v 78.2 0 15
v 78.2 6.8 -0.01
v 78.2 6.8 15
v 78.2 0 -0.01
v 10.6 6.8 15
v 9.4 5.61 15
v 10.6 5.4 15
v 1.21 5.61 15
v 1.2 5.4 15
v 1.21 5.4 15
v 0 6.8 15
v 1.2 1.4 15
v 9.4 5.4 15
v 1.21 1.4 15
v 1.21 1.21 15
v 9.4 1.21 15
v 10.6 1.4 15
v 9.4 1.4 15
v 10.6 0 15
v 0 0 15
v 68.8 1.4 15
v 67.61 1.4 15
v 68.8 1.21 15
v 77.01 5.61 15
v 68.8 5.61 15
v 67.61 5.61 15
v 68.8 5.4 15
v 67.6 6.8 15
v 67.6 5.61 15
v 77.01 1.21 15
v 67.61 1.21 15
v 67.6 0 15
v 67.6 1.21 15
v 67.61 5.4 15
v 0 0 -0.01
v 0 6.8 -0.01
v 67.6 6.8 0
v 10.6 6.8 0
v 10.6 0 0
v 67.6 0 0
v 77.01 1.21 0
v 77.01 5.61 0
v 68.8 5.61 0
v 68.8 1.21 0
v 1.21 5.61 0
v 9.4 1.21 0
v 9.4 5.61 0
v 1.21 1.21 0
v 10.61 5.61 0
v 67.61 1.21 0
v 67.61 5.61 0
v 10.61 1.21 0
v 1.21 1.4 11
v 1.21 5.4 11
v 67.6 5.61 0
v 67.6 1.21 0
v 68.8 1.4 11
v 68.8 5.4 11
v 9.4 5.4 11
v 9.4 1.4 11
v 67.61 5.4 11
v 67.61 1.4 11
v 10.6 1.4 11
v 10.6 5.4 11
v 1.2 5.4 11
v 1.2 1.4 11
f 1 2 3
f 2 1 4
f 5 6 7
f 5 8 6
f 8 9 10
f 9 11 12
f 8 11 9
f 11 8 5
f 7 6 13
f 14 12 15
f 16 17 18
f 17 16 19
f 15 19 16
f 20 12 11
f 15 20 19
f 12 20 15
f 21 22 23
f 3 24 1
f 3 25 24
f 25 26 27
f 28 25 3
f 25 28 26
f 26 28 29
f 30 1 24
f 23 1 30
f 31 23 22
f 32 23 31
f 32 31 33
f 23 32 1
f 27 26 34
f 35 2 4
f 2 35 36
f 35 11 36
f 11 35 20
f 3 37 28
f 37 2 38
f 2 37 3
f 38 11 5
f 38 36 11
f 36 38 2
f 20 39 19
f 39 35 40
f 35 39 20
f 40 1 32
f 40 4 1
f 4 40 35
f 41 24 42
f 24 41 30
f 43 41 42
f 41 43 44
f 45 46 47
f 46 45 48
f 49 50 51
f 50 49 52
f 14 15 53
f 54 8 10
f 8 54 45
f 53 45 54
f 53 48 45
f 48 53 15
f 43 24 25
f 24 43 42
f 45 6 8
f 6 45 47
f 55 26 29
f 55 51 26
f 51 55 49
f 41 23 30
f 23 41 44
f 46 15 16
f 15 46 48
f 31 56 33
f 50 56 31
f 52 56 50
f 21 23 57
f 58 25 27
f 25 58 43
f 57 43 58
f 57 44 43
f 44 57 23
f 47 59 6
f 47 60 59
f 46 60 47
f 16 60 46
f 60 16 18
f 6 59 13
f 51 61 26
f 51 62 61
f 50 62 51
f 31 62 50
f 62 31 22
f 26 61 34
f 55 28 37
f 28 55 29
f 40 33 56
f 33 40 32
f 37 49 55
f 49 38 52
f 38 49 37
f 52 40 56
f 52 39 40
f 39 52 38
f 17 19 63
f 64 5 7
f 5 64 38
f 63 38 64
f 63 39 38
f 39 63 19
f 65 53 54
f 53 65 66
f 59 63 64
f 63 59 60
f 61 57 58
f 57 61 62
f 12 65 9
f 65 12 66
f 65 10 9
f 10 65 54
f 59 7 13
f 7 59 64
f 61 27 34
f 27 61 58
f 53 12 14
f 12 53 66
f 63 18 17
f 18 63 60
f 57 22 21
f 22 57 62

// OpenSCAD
// file: ../Base/Boxes.scad
// Fischertechnik Box Foundation
// Pre-designed Boxes

use <Constants.scad>

include <PlacementOptions.scad>

box190Width = 190;
box190Depth = 130;
box130Width = 130;
box130Depth = 95;

// Values are from an original ec3 box
topBottomDifference = 1.5;
outerHeight = 40;
baseThickness = 1.8;
innerHeight = outerHeight - baseThickness;
stackExcess = 5.7;
radius = 3.5;
wallThickness = 1.5;
tolerance = 0.2;

boxWallThickness = wallThickness;
boxBaseThickness = baseThickness;
boxWebWidth = 3.0;

// getBoxWallThickness()
// Gets the wall thickness of a Fischertechnik Box
function getBoxWallThickness() = boxWallThickness;

// getBoxUsageHeight(height = 38.2)
// Gets the usable height of a Fischertechnik box
// height = Outer height of the box from the bottom to the upper edge.
function getBoxUsageHeight(height = outerHeight) = height - baseThickness - stackExcess;

// getBoxInnerHeight()
// Gets the inner height of a Fischertechnik box, including the stack excess
function getBoxInnerHeight() = innerHeight;

// getBoxBaseThickness()
// Gets the thickness of the Fischertechnik box base.
function getBoxBaseThickness() = boxBaseThickness;

// getBoxWebWidth()
// Gets the width of a box web
function getBoxWebWidth() = boxWebWidth;

// getBox190Space()
// Gets the usable inner space of a Box 190 as an x/y-list
function getBox190Space() = [
    box190Width - 2*getBoxWallThickness() - topBottomDifference, 
    box190Depth - 2*getBoxWallThickness() - topBottomDifference ];

// RoundedCornerPlate(width, depth, height, radius)
// Creates a body plate with rounded corners for a box. Used
// also to create the complete box with the hull module.
// width = Width of the plate
// depth = depth of the plate 
// height = thickness of the plate
// radius = radius of the rounded corner
module RoundedCornerPlate(width, depth, height, radius) {
    translate([radius, radius])
    hull() {
        w = width-2*radius;
        d = depth-2*radius;
        cube([w, d, height]);
        cylinder(height, r=radius, $fn=getFragments());
        translate([w, 0])
            cylinder(height, r=radius, $fn=getFragments());
        translate([w, d])
            cylinder(height, r=radius, $fn=getFragments());
        translate([0, d])
            cylinder(height, r=radius, $fn=getFragments());
    }
}

// BoxBase(width, depth)
// Creates an empty stackable Fischertechnik compatible box
// width = Outer width of the box (190, 130, ...)
// depth = Outer depth of the box (130, 95, ...)

module BoxBase(width, depth, height=outerHeight) {    
    thinPlate = 0.01;

    innerHeight = height - baseThickness;    
    
    module Body(tolerance=tolerance) {
        hull() {
            // Bottom with tolerance to fit into the original boxes when stacked
            translate([-wallThickness+tolerance, -wallThickness+tolerance, -baseThickness])
                RoundedCornerPlate(width-topBottomDifference-2*tolerance, depth-topBottomDifference-2*tolerance, thinPlate, radius);
            
            // Top
            translate([-wallThickness-topBottomDifference/2, -wallThickness-topBottomDifference/2, innerHeight-thinPlate])
                RoundedCornerPlate(width, depth, thinPlate, radius);
         }
    }

    module Cutoff() {
        hull() {
            coWidth = width - 2*wallThickness;
            coDepth = depth - 2*wallThickness;
            
            // Bottom
            RoundedCornerPlate(coWidth-topBottomDifference, coDepth-topBottomDifference, thinPlate, radius);

            // Top
            translate([-topBottomDifference/2, -topBottomDifference/2, innerHeight+thinPlate]) 
                RoundedCornerPlate(coWidth, coDepth, thinPlate, radius);
        }
    }
    
    difference() {        
        Body();
        Cutoff();
        stackOffset = innerHeight - stackExcess;
        translate([0, 0, stackOffset + baseThickness])
            Body(tolerance=0);
    }
}

// Creates the Fischertechnik empty box 130x190 mm and places it at position 0,0
// 190x130 are the outer sizes, the inner space is slightly smaller. Use getBox190Space() to get the inner sizes.
// The box is positioned that the usable inner space is at the 0,0,0 position.

module Box190() {
    BoxBase(box190Width, box190Depth);
}

// Gets the usable inner space of a Box 130 as an x/y-list
function getBox130Space() = [
    box130Width - 2*getBoxWallThickness() - topBottomDifference, 
    box130Depth - 2*getBoxWallThickness() - topBottomDifference ];

// Creates the Fischertechnik empty box 95x130 mm and places it at position 0,0
// 190x130 are the outer sizes, the inner space is slightly smaller. Use getBox190Space() to get the inner sizes.
// The box is positioned that the usable inner space is at the 0,0,0 position.

module Box130() {
    BoxBase(box130Width, box130Depth);
}

// Creates a web at the specified box walls
// corner 0 = LowerLeft, 1 = UpperLeft, 2 = UpperRight, 3 = LowerRight
// side 0 = LeftOfCorner, 1 = RightOfCorner
// distance = Distance in mm from the corner
// boxSpace = inner width and depth of the box (default: Box 190)
// webWidth = length of the web (default is 3 mms)
// webThickness = thickness of the web (default is 1 mm)
// height = Height of the web (standard is getBoxUsageHeight())
// sink = How much of the web is sunk into the wall

module BoxWeb(
    corner, 
    side, 
    distance, 
    boxSpace=getBox190Space(), 
    webWidth=getBoxWebWidth(), 
    webThickness=1.0, 
    height=getBoxUsageHeight(),
    sink = getBoxWallThickness()/2) {
    width = (corner % 2 == 0) ? 
            (side == LeftOfCorner ? webWidth : webThickness) :
            (side == LeftOfCorner ? webThickness : webWidth);

    depth = (corner % 2 == 0) ? 
            (side == RightOfCorner ? webWidth : webThickness) :
            (side == RightOfCorner ? webThickness : webWidth);
    
    xDiff = corner == LowerLeft ? 
                (side == LeftOfCorner ? -sink : distance) :
            (corner == UpperLeft ?                
                (side == LeftOfCorner ? distance : -sink) :
            (corner == UpperRight ?
                (side == LeftOfCorner ? boxSpace.x-webWidth+sink : boxSpace.x-distance-webThickness) :
                (side == LeftOfCorner ? boxSpace.x-distance-webThickness: boxSpace.x-webWidth+sink)));

    yDiff = corner == LowerLeft ? 
                (side == RightOfCorner ? -sink : distance) :
            (corner == UpperLeft ?
                (side == RightOfCorner ? boxSpace.y-distance-webThickness : boxSpace.y-webWidth+sink) :
            (corner == UpperRight ?
                (side == RightOfCorner ? boxSpace.y-webWidth+sink : boxSpace.y-distance-webThickness) :
                (side == RightOfCorner ? distance : -sink)));
    
    translate([xDiff, yDiff, -getExcess()])
        cube([width, depth, height + 2*getExcess()]);
}
// file: ../Base/Rotation.scad
// Fischertechnik Box Foundation
// Geometry Helpers Rotation

include <PlacementOptions.scad>

// getRotatedSpace(space, rotation=NoRotation)
// Rotates the space dependent on the specified rotation

function getRotatedSpace(space, rotation=NoRotation) = [
    (rotation == Rotate90 || rotation == Rotate270) ? space.y : space.x,
    (rotation == Rotate90 || rotation == Rotate270) ? space.x : space.y
];

// Rotates the given space around the fixed left lower corner
// space = the space the children needs as width/depth list [width,depth]
// rotation = 0 Rotate0 degrees, 1 Rotate90 degrees, 2 Rotate180 degrees, 3 Rotate270 degrees (equivalent to -90)

module RotateFix(space, rotation=NoRotation) {
    dy = (rotation == Rotate0 || rotation == Rotate270) ? 0 :
        (rotation == Rotate90) ? space.x :
        space.y;
    dx = (rotation < Rotate180) ? 0 :
        (rotation == Rotate180) ? space.x :
        space.y;
    
    translate([dx, dy, 0])
        rotate([0, 0, rotations[rotation]])
            children();
}
// file: ../Base/Alignment.scad
// Fischertechnik Box Foundation
// Geometry Helpers Alignment

include <PlacementOptions.scad>

// getAlignedX(elementWidth, spaceWidth, align=AlignRight, offset=0)
// Gets the aligned X offset of an element with the given
// width in the given space.
// elementWidth = The width of the element to positon
// spaceWidth = The space where the element should be aligned
// align = 0 AlignLeft, 1 AlignCenter, 2 AlignRight
// offset = an optional offset from the aligned position. When
// aligned left or centered, then positive values are in X direction.
// When aligned right then positive values are in negative X direction.

function getAlignedX(elementWidth, spaceWidth, align=AlignRight, offset=0) =
    (align == AlignLeft) ?
        offset :
        ((align == AlignCenter) ?
        (spaceWidth - elementWidth)/2 + offset :
        spaceWidth - offset - elementWidth);

// getAlignedY(elementDepth, spaceDepth, align=AlignTop, offset=0)
// Gets the aligned Y offset of an element with the given
// depth in the given space.
// elementDepth = The depth of the element to positon
// spaceDepth = The space where the element should be aligned
// align = 0 AlignBottom, 1 AlignCenter, 2 AlignTop
// offset = an optional offset from the aligned position. When
// aligned bottom or centered, then positive values are in Y direction.
// When aligned top then positive values are in negative Y direction.

function getAlignedY(elementDepth, spaceDepth, align=AlignTop, offset=0) =
    (align == AlignBottom) ?
        offset :
        ((align == AlignCenter) ?
        (spaceDepth - elementDepth)/2 + offset :
        spaceDepth - offset - elementDepth);
// file: ../Base/PlacementOptions.scad
// Fischertechnik Box Foundation
// Placement Options

// Alignment
NoAlign = 0;
AlignLeft = 1;
AlignBottom = 2;
AlignCenter = 3;
AlignRight = 4;
AlignTop = 5;

// Element rotation degree steps
rotations = [0, -90, -180, -270];

// Rotation
NoRotation = 0;
Rotate0 = 0;
Rotate90 = 1;
Rotate180 = 2;
Rotate270 = 3;

// Docking (seen from above)
NoDock = -1;
DockLeft = 0;
DockTop = 1;
DockRight = 2;
DockCorner = 2;
DockBottom = 3;

// Web corners
LowerLeft = 0;
UpperLeft = 1;
UpperRight = 2;
LowerRight = 3;

// Web position relative to corner
LeftOfCorner = 0;
RightOfCorner = 1;

// Rails direction
Horizontal = true;
Vertical = false;
// file: ../Base/Placement.scad
// Fischertechnik Box Foundation
// Geometry Helpers Placement

use <Constants.scad>
use <Alignment.scad>
use <Rotation.scad>
use <Boxes.scad>

include <PlacementOptions.scad>

// Place(x=0, y=0, elementSpace=[0,0], alignX=AlignLeft, alignY=AlignBottom, rotation=Rotate0, boxSpace=getBox190Space())
// Places the child at the specified position
// y = Y-Position. This is a relative position when an X aligment is specified.
// x = X-Position. This is a relative position when an Y aligment is specified.
// elementSpace = space of the element to be placed [x,y]
// alignX = -1=NoAlign, 0 AlignLeft, 1 AlignCenter, 3 AlignRight (elementSpace and boxSpace required!)
// alignY = -1=NoAlign, 2 AlignBottom, 1 AlignCenter, 4 AlignTop (elementSpace and boxSpace required!)
// rotation = 0 Rotate0 0 degrees, 1 Rotate90 90 degrees, 
// 2 Rotate180 180 degrees, 3 Rotate270 270 degrees (equivalent to -90)
// boxSpace = Inner space of the box where the placement occurs [x,y] - default is Box 190x130 inner space

module Place(x=0, y=0, elementSpace=[0,0], 
  alignX=AlignLeft, alignY=AlignBottom, 
  rotation=NoRotation, boxSpace=getBox190Space()) {

    module Position(x, y, space, rotation=Rotate0) {
        translate([x, y, 0])
            RotateFix(space, rotation)
                children();
    }

    space = getRotatedSpace(elementSpace, rotation);
    alignedX = getAlignedX(space.x, boxSpace.x, alignX, x);
    alignedY = getAlignedY(space.y, boxSpace.y, alignY, y);
    Position(alignedX, alignedY, elementSpace, rotation)
        children();
}

// Center(space=getBox130Space(), elementSpace=[0,0])
// space = Space where the children is centered. For cylinder use centered=true and no elementSpace.
// elementSpace = space of the element to be centered [x,y]

module Center(space=getBox190Space(), elementSpace=[0,0]) {
    Place(elementSpace=elementSpace, boxSpace=space, alignX=AlignCenter, alignY=AlignCenter)
        children();
}

// CenterHorizontal(width=0, y=0, offset=0, space=getBox130Space())
// width = Width of the element to be placed.
// y = Y position of the element
// offset = Offset from the center position (negative will be left of the center)
// space = Space where the element is placed

module CenterHorizontal(width=0, y=0, offset=0, space=getBox190Space()) {
    Place(x=offset, y=y, elementSpace=[width, 0], boxSpace=space, alignX=AlignCenter)
        children(0);
}

// CenterVertical(depth=0, x=0, offset=0, space=getBox130Space())
// depth = Depth of the element to be placed.
// x = X position of the element
// offset = Offset from the center position (negative will be down of the center)
// space = Space where the element is placed

module CenterVertical(depth=0, x=0, offset=0, space=getBox190Space()) {
    Place(x=x, y=offset, elementSpace=[0, depth], boxSpace=space, alignY=AlignCenter)
        children(0);
}

// getIsVertical(align)
// True if the specified alignment needs a vertical orientation for a divider (AlignRight, AlignLeft)

function getIsVertical(align) = (align == AlignRight || align == AlignLeft);

// getIsHorizontal(align)
// True if the specified alignment needs a horizontal orientation for a divider (AlignTop, AlignBottom)

function getIsHorizontal(align) = (align == AlignTop || align == AlignBottom);
// file: ../Base/Constants.scad
// Fischertechnik Box Foundation
// Constants

// Constant values necessary for multiple elements

// Base constants
dividerThickness = 1.2;
excess = 0.01;
fragments = 90;
tolerance = 0.8;

// Gets the thickness of a divider 
function getDividerThickness() = dividerThickness;

// Gets the excess that is used to merge walls into each other
function getExcess() = excess;

// Gets amount of fragments of a cylinder
function getFragments() = fragments;

// Gets the inner tolerance of a frame to each side
function getTolerance() = tolerance;


// Fischertechnik specific constants
axisDiameter = 4;
axisBottomDiameter = axisDiameter + 1;
axisTolerance = 0.2;
axisLockingLength = 8;

// Gets axis diameter of Fischertechnik axis
function getAxisDiameter() = axisDiameter;

// Gets axis diameter tolerance (subtracted for element axis)
function getAxisTolerance() = axisTolerance;

// Gets the axis diameter for standing axis
function getStandAxisDiameter() = getAxisDiameter() - getAxisTolerance();

// Gets axis bottom diameter for thicker part at the bottom
function getAxisBottomDiameter() = axisBottomDiameter;

// Gets the lengthh of the locking part of a locking axis
function getAxisLockingLength() = axisLockingLength;

// Studs

studHeight = 2.5;
studTolerance = 0.2;
studRailDistance = 9;   // as in ft 50

// gets the height of a connecting stud
function getStudHeight() = studHeight;

// gets the connecting stud height tolerance
function getStudTolerance() = studTolerance;

// gets the default rail distance for studs
function getStudRailDistance() = studRailDistance;

// Dockable Frame with Edge

standardEdgeDistance = 2.5;
standardWebDistance = 11.5;
standardCornerLength = 15;

// gets the standard distance to the wall of the box for dockable frames with webs
function getStandardEdgeDistance() = standardEdgeDistance;

// gets the standard distance of each web to the corner of the dockable frame
function getStandardWebDistance() = standardWebDistance;

// gets the standard length of the corner walls of a dockable frame
function getStandardCornerLength() = standardCornerLength;

// Tubes

tubeWallFactor = 0.8;

// gets the wall thickness of a tube.
function getTubeWallThickness() = tubeWallFactor * getDividerThickness();

// Small Parts and Divider Frame

smallPartsFrameHeight = 20;

// gets the frame height for docked small parts boxes.
function getSmallPartsFrameHeight() = smallPartsFrameHeight;

// Hubs

hubRingDiameter = 19.5;
hubRingLevelDiameter = 21;

// gets the diameter of a tube matching the inner ring of a wheel
function getHubRingDiameter() = hubRingDiameter;

// gets the diameter of a hub tube with a thicker diameter
function getHubRingLevelDiameter() = hubRingLevelDiameter;

// Struts

strutAddLength = 9.0;
strutDepth = 8.0;

// gets the full length of a strut
function getFullStrutLength(length) = length + strutAddLength;

// gets the radius of the end of a strut
function getStrutEndRadius() = strutAddLength / 2;

// gets the the depth of a strut
function getStrutDepth() = strutDepth;

// Propeller

propellerAxisDiameter = 7.0;
propellerAxisTolerance = 0.2;

// gets the propeller axis outer diameter
function getPropellerAxisDiameter() = propellerAxisDiameter;

// gets the propeller axis printing tolerance
function getPropellerAxisTolerance() = propellerAxisTolerance;
// main file
// Fischertechnik Box Library
// Frame for single 75 mm Locking Axis
// 35087

use <../ModelBase/Complex.scad>

/* [Element Parameters] */
count = 1;

/* [Hidden] */
length = 75;

// getFrameAxis75Space(count01)
// count = Count of axis
// Gets the width (.x) and depth (.y) of the axis frame.

function getFrameAxis75Space(count=1) = getFrameAxisSpace(length, count);

// FrameAxis80(count = 1)
// count = Count of axis
// Axis holder for a single 80 mm axis.

module FrameAxis75(count = 1) {
    FrameAxis(length, count=count);
}

// Test
color("lightgray")
FrameAxis75(count);
